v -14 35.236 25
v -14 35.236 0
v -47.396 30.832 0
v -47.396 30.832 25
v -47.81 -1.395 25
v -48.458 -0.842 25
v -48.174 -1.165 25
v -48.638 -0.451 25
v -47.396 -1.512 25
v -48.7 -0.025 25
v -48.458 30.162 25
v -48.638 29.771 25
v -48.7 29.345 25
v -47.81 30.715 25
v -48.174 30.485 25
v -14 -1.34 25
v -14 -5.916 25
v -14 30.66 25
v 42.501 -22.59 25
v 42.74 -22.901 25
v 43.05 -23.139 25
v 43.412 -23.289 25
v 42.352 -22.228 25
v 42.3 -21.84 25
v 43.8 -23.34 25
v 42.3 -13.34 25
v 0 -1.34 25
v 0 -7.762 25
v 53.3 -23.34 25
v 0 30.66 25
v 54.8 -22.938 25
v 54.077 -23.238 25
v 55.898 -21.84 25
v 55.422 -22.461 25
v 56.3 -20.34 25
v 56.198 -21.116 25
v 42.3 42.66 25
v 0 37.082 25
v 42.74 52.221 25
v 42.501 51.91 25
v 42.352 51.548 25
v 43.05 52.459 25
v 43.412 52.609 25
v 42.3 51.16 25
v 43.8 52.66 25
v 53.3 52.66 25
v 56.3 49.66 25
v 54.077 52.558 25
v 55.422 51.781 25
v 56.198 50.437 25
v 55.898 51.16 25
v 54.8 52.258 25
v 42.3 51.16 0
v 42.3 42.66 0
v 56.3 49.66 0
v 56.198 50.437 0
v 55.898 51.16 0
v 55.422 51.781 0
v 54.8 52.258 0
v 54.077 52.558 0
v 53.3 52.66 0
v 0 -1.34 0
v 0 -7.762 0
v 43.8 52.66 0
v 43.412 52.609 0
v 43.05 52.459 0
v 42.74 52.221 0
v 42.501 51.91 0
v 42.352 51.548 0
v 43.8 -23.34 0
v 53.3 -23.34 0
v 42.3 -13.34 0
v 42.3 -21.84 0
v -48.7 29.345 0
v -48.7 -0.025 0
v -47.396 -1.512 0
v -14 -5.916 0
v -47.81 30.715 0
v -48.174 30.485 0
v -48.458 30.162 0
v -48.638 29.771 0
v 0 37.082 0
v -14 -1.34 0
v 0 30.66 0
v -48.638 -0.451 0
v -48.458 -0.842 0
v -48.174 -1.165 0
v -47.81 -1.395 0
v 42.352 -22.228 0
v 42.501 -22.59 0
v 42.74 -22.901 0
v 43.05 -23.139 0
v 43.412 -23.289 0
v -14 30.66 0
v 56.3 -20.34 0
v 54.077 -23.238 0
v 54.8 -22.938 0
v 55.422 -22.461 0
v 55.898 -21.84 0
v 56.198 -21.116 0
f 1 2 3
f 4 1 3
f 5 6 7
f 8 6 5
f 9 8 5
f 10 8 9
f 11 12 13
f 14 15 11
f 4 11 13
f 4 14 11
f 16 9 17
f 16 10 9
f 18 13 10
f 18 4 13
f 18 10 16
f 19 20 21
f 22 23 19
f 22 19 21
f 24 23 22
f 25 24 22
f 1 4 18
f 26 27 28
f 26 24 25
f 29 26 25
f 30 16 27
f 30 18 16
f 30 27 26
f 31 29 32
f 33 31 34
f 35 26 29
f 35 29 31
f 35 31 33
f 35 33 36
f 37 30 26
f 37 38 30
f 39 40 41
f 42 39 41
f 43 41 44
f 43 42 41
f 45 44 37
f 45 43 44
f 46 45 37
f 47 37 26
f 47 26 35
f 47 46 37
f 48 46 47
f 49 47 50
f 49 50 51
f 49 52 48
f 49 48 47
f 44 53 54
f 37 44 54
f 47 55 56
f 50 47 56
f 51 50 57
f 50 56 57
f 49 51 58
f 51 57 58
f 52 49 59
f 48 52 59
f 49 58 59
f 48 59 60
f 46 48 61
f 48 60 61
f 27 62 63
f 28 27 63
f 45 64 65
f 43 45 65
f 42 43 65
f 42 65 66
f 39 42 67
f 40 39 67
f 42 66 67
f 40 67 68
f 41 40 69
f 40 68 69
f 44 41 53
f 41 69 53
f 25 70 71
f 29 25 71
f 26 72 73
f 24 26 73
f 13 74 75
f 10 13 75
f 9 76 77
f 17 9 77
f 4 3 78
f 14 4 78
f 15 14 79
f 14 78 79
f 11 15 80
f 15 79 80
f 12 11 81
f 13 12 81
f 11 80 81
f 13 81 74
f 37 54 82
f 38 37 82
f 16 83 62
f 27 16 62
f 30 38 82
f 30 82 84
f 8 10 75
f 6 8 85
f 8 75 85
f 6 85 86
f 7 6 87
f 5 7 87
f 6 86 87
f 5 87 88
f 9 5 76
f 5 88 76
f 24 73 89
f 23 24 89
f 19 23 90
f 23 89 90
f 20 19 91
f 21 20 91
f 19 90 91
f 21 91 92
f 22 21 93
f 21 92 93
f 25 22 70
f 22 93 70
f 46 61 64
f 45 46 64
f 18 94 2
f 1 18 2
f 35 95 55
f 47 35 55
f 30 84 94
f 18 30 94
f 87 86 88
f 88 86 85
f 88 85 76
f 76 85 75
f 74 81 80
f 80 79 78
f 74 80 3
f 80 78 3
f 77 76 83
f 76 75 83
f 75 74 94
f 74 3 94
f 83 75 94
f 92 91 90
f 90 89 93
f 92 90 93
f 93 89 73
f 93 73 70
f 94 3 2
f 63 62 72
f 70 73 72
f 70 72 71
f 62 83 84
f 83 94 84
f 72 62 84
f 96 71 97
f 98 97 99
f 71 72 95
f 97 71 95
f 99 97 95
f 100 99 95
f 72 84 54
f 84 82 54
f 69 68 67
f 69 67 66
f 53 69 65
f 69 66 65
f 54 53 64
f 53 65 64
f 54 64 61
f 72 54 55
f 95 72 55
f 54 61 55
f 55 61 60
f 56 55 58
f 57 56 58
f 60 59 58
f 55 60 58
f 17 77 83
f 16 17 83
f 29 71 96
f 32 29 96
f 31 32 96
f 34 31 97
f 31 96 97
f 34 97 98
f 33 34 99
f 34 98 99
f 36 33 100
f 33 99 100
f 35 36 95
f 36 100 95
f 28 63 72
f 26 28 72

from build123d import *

# Parameters (mm, degrees)
F1_DEPTH = 25


with BuildPart() as f1:
    # F0 (on Top) → F1 (new body)
    with BuildSketch(Plane.XY):
        with BuildLine():
            Line((56.300399, -20.339935), (56.300399, 49.660065))
            ThreePointArc((56.300399, 49.660065), (55.421719, 51.781386), (53.300399, 52.660065))
            Line((53.300399, 52.660065), (43.800399, 52.660065))
            ThreePointArc((43.800399, 52.660065), (42.739739, 52.220726), (42.300399, 51.160065))
            Line((42.300399, 51.160065), (42.300399, 42.660065))
            Line((42.300399, 42.660065), (0, 37.081991))
            Line((0, 37.081991), (0, 30.660065))
            Line((0, 30.660065), (-14, 30.660065))
            Line((-14, 30.660065), (-14, 35.235837))
            Line((-14, 35.235837), (-47.395706, 30.832008))
            ThreePointArc((-47.395706, 30.832008), (-48.327466, 30.333781), (-48.699601, 29.344882))
            Line((-48.699601, 29.344882), (-48.699601, 14.660065))
            Line((-48.699601, 14.660065), (-48.699601, -0.024751))
            ThreePointArc((-48.699601, -0.024751), (-48.327466, -1.01365), (-47.395706, -1.511877))
            Line((-47.395706, -1.511877), (-14, -5.915706))
            Line((-14, -5.915706), (-14, -1.339935))
            Line((-14, -1.339935), (0, -1.339935))
            Line((0, -1.339935), (0, -7.76186))
            Line((0, -7.76186), (42.300399, -13.339935))
            Line((42.300399, -13.339935), (42.300399, -21.839935))
            ThreePointArc((42.300399, -21.839935), (42.739739, -22.900595), (43.800399, -23.339935))
            Line((43.800399, -23.339935), (53.300399, -23.339935))
            ThreePointArc((53.300399, -23.339935), (55.421719, -22.461255), (56.300399, -20.339935))
        make_face()
    extrude(amount=F1_DEPTH)


solid = f1.part
